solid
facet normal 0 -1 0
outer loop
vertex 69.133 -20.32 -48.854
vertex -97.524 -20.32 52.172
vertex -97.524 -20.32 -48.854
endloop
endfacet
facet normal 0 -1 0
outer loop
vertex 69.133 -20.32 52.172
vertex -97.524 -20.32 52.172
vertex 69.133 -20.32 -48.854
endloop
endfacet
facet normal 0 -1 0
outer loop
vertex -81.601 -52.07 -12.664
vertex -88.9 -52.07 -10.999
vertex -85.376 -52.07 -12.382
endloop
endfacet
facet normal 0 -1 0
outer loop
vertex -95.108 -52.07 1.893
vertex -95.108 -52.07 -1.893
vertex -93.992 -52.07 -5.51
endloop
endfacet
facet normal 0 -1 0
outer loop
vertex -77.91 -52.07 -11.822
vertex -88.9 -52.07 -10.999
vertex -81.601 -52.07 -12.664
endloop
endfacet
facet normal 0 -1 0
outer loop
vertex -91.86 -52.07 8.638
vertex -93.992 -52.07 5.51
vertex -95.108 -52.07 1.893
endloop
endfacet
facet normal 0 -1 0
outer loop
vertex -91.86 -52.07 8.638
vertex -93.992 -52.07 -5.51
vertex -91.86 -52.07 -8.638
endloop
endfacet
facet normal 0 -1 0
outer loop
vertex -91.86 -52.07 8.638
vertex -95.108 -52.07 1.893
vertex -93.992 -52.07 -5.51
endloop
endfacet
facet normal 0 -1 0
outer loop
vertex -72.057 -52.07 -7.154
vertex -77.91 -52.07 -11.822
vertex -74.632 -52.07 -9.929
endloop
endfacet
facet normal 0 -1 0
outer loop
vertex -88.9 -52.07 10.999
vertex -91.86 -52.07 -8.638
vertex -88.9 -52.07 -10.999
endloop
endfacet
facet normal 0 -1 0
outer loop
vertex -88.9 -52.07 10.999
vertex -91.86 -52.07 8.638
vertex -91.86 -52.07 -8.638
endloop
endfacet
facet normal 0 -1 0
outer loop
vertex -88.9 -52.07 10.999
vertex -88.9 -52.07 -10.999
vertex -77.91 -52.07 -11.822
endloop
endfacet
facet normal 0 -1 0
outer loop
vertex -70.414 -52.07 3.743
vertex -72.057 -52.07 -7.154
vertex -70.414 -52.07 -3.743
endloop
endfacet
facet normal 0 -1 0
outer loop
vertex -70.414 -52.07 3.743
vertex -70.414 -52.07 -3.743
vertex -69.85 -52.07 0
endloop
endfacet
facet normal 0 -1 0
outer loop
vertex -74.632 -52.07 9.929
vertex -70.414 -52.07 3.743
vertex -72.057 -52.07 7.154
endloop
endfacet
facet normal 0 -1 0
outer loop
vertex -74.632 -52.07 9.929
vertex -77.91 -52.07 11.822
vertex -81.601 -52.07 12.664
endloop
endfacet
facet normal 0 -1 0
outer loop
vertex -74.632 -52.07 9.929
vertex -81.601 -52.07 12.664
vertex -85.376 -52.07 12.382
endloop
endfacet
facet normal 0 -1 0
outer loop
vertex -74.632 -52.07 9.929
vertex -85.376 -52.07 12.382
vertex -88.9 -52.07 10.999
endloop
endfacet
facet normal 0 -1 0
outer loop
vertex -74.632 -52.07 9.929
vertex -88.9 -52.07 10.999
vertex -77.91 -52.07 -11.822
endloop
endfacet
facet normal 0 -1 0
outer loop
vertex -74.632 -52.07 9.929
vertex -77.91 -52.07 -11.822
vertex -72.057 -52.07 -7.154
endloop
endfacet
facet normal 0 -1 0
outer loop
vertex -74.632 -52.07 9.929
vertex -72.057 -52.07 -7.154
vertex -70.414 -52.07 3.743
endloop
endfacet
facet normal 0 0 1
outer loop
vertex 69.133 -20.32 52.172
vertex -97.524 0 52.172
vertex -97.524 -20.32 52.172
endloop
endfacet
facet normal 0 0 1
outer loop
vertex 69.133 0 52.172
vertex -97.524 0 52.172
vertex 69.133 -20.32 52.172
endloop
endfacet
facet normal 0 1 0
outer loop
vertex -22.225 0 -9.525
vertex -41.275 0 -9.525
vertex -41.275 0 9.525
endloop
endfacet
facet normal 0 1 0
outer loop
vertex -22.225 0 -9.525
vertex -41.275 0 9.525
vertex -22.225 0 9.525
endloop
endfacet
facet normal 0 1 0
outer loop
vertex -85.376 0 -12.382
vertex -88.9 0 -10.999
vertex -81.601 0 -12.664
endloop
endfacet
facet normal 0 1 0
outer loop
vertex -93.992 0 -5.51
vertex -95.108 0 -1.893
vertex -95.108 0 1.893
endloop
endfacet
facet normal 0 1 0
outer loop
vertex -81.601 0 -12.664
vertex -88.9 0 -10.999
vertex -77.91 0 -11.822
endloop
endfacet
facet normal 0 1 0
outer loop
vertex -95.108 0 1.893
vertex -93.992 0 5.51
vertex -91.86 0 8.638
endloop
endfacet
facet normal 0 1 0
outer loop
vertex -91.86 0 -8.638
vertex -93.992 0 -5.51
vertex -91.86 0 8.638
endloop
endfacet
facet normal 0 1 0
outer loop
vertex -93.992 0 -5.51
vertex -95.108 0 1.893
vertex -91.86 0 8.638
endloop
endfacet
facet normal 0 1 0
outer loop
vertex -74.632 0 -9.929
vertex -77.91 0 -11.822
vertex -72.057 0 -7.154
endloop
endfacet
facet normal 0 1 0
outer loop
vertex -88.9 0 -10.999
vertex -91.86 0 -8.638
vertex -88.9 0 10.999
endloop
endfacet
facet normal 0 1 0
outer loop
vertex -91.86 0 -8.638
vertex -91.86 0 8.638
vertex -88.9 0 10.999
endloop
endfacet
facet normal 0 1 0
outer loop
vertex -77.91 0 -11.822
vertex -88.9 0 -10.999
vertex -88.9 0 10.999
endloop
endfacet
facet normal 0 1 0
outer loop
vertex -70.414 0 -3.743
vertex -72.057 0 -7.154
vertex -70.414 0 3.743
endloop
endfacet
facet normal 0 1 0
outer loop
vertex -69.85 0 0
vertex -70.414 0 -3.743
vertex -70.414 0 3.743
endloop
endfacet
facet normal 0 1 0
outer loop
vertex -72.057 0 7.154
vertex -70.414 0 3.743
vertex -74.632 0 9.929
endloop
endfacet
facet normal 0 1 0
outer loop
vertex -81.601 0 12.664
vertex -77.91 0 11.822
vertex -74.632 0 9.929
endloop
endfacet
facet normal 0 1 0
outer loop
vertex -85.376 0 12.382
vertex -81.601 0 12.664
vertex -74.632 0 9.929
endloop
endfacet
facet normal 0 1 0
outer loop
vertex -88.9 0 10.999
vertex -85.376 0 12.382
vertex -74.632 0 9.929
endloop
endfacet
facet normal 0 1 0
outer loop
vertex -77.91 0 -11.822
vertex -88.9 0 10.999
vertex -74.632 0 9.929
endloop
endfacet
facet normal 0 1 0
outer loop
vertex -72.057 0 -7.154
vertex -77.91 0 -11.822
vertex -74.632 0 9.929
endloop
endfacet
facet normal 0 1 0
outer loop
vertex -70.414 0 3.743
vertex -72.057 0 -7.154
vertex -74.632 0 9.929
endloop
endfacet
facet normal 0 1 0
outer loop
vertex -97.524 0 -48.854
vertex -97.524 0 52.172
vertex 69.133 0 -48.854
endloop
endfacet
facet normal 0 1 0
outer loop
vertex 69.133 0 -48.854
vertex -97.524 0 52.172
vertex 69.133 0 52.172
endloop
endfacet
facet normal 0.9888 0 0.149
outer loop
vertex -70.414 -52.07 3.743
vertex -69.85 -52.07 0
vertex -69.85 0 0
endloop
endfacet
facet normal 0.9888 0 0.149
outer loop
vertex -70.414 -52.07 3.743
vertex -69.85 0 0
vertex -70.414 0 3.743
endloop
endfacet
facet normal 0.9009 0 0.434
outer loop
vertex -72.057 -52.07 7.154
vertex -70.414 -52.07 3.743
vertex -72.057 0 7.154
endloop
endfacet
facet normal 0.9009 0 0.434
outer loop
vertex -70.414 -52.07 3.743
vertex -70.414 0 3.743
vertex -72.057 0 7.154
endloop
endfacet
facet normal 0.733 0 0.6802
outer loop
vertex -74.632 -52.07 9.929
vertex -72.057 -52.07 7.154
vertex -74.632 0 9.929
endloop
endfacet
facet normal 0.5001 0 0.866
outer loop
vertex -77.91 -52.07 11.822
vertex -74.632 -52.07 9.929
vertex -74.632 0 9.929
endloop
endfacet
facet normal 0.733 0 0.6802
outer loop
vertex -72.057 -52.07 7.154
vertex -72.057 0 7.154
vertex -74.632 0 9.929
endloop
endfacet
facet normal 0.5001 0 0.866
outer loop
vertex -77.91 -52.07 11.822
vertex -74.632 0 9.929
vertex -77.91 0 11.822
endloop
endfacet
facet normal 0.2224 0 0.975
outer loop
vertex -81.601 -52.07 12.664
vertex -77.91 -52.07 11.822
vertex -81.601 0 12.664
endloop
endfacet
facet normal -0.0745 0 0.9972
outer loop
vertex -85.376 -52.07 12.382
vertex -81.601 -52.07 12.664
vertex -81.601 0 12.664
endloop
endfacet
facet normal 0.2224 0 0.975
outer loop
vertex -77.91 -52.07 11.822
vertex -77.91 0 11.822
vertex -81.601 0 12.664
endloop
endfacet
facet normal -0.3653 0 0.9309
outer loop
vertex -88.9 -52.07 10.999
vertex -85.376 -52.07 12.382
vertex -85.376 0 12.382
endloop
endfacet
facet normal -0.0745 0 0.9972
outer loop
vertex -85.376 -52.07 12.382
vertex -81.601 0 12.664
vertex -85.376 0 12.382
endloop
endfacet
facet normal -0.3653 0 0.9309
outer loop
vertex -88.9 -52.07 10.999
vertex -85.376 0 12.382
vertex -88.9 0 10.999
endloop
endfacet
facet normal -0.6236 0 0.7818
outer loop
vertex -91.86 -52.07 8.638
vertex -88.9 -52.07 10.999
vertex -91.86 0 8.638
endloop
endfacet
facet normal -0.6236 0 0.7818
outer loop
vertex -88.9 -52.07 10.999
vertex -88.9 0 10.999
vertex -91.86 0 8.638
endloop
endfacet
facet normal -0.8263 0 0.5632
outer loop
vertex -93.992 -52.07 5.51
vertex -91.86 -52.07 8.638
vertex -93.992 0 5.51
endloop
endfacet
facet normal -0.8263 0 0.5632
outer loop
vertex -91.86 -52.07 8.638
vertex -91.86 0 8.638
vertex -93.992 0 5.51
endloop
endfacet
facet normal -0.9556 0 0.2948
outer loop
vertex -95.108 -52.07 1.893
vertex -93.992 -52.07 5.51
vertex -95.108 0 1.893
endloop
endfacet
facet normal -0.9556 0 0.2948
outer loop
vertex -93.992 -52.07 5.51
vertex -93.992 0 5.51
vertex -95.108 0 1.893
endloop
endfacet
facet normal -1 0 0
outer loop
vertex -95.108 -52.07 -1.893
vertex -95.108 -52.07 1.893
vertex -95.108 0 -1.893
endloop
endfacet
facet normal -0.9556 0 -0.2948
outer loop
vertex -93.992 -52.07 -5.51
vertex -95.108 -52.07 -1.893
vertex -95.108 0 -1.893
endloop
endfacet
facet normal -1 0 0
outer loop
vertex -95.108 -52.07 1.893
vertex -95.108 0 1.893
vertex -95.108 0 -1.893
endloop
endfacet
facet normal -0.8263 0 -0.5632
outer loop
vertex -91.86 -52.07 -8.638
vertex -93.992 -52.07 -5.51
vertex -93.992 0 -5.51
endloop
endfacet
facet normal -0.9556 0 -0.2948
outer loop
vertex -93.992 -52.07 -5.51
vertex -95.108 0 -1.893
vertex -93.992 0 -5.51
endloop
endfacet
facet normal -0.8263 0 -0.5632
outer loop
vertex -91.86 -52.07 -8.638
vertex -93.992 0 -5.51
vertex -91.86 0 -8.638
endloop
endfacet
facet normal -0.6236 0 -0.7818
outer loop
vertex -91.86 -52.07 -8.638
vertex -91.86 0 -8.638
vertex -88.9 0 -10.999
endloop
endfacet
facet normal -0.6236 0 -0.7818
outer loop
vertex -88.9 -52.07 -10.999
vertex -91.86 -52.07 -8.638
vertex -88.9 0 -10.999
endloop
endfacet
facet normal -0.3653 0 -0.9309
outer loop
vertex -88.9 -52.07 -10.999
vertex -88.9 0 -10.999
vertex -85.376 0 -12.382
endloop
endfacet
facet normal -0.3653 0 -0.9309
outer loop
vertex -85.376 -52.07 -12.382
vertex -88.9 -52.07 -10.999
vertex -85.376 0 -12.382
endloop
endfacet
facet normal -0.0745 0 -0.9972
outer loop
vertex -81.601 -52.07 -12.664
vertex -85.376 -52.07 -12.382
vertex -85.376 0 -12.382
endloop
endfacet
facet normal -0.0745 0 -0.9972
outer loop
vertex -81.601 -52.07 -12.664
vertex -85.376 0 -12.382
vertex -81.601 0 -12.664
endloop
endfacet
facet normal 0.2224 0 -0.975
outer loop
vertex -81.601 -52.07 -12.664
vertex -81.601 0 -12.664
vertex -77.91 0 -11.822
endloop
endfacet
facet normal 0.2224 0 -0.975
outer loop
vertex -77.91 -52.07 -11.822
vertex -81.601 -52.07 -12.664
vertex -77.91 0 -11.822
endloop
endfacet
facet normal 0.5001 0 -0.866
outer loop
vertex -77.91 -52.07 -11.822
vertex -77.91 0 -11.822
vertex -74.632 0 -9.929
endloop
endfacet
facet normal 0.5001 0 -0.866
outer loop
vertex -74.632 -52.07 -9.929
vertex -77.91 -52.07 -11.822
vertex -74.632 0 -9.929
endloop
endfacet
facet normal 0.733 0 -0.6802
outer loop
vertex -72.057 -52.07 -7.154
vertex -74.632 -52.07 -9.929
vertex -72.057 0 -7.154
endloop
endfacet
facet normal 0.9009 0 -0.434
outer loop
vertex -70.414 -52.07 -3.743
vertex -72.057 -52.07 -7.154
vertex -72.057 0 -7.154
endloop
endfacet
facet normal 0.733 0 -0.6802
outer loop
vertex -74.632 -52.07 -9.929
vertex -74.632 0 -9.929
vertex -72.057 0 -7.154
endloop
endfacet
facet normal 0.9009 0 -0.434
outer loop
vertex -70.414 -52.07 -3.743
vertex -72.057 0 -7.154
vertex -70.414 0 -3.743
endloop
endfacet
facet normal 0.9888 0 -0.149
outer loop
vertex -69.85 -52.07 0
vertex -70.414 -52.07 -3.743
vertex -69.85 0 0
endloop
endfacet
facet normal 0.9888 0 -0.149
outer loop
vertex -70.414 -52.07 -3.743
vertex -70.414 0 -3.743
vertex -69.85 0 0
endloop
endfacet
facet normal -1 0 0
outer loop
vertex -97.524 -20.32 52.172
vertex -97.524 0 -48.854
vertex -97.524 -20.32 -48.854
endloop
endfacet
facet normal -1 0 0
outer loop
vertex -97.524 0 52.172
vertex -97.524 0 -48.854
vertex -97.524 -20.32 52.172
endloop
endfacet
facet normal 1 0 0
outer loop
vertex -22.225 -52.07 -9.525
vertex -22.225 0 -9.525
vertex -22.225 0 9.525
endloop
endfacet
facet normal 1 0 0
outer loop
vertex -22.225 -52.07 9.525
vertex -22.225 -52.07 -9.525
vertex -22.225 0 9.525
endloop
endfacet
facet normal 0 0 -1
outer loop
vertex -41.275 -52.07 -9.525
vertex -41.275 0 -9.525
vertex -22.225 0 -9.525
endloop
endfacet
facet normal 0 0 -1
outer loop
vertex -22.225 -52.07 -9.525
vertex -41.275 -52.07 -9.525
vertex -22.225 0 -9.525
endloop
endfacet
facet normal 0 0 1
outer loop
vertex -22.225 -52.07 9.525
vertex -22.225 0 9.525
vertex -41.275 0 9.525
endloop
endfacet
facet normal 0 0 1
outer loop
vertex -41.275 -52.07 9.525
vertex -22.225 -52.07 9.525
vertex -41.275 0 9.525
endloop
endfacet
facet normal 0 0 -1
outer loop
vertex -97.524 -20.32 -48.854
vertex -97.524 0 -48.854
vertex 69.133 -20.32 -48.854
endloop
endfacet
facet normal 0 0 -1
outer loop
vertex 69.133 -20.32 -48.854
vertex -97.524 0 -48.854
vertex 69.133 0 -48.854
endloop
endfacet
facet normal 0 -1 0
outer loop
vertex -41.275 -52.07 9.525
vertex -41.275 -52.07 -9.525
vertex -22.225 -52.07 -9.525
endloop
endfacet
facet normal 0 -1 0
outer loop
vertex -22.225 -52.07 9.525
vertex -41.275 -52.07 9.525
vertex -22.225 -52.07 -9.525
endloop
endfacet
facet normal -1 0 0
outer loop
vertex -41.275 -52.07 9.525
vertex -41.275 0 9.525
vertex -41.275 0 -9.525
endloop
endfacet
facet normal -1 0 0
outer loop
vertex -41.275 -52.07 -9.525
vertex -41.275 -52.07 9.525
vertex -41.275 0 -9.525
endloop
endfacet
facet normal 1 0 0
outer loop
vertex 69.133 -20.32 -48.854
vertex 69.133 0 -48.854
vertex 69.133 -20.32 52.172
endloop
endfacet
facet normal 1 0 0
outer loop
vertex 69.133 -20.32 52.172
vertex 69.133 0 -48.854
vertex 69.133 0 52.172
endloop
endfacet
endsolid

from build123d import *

# Parameters (mm, degrees)
F1_W     = 166.656778
F1_H     = 101.026456
F2_DEPTH = 20.32
F0_R     = 12.7
F3_DEPTH = 52.07


with BuildPart() as f2:
    # F1 (on Front) → F2 (new body)
    with BuildSketch(Plane.XZ):
        with Locations((-14.195323, 1.659194)):
            Rectangle(F1_W, F1_H)
    extrude(amount=F2_DEPTH)


with BuildPart() as f3:
    # F0 (on Front) → F3 (new body)
    with BuildSketch(Plane.XZ):
        with Locations((-82.55, 0)):
            Circle(F0_R)
        Polygon((-22.225, -9.525), (-22.225, 0), (-31.75, 0), (-41.275, 0), (-41.275, -9.525), align=None)
        Polygon((-31.75, 0), (-22.225, 0), (-22.225, 9.525), (-41.275, 9.525), (-41.275, 0), align=None)
    extrude(amount=F3_DEPTH)


solid = Compound([f2.part, f3.part])
